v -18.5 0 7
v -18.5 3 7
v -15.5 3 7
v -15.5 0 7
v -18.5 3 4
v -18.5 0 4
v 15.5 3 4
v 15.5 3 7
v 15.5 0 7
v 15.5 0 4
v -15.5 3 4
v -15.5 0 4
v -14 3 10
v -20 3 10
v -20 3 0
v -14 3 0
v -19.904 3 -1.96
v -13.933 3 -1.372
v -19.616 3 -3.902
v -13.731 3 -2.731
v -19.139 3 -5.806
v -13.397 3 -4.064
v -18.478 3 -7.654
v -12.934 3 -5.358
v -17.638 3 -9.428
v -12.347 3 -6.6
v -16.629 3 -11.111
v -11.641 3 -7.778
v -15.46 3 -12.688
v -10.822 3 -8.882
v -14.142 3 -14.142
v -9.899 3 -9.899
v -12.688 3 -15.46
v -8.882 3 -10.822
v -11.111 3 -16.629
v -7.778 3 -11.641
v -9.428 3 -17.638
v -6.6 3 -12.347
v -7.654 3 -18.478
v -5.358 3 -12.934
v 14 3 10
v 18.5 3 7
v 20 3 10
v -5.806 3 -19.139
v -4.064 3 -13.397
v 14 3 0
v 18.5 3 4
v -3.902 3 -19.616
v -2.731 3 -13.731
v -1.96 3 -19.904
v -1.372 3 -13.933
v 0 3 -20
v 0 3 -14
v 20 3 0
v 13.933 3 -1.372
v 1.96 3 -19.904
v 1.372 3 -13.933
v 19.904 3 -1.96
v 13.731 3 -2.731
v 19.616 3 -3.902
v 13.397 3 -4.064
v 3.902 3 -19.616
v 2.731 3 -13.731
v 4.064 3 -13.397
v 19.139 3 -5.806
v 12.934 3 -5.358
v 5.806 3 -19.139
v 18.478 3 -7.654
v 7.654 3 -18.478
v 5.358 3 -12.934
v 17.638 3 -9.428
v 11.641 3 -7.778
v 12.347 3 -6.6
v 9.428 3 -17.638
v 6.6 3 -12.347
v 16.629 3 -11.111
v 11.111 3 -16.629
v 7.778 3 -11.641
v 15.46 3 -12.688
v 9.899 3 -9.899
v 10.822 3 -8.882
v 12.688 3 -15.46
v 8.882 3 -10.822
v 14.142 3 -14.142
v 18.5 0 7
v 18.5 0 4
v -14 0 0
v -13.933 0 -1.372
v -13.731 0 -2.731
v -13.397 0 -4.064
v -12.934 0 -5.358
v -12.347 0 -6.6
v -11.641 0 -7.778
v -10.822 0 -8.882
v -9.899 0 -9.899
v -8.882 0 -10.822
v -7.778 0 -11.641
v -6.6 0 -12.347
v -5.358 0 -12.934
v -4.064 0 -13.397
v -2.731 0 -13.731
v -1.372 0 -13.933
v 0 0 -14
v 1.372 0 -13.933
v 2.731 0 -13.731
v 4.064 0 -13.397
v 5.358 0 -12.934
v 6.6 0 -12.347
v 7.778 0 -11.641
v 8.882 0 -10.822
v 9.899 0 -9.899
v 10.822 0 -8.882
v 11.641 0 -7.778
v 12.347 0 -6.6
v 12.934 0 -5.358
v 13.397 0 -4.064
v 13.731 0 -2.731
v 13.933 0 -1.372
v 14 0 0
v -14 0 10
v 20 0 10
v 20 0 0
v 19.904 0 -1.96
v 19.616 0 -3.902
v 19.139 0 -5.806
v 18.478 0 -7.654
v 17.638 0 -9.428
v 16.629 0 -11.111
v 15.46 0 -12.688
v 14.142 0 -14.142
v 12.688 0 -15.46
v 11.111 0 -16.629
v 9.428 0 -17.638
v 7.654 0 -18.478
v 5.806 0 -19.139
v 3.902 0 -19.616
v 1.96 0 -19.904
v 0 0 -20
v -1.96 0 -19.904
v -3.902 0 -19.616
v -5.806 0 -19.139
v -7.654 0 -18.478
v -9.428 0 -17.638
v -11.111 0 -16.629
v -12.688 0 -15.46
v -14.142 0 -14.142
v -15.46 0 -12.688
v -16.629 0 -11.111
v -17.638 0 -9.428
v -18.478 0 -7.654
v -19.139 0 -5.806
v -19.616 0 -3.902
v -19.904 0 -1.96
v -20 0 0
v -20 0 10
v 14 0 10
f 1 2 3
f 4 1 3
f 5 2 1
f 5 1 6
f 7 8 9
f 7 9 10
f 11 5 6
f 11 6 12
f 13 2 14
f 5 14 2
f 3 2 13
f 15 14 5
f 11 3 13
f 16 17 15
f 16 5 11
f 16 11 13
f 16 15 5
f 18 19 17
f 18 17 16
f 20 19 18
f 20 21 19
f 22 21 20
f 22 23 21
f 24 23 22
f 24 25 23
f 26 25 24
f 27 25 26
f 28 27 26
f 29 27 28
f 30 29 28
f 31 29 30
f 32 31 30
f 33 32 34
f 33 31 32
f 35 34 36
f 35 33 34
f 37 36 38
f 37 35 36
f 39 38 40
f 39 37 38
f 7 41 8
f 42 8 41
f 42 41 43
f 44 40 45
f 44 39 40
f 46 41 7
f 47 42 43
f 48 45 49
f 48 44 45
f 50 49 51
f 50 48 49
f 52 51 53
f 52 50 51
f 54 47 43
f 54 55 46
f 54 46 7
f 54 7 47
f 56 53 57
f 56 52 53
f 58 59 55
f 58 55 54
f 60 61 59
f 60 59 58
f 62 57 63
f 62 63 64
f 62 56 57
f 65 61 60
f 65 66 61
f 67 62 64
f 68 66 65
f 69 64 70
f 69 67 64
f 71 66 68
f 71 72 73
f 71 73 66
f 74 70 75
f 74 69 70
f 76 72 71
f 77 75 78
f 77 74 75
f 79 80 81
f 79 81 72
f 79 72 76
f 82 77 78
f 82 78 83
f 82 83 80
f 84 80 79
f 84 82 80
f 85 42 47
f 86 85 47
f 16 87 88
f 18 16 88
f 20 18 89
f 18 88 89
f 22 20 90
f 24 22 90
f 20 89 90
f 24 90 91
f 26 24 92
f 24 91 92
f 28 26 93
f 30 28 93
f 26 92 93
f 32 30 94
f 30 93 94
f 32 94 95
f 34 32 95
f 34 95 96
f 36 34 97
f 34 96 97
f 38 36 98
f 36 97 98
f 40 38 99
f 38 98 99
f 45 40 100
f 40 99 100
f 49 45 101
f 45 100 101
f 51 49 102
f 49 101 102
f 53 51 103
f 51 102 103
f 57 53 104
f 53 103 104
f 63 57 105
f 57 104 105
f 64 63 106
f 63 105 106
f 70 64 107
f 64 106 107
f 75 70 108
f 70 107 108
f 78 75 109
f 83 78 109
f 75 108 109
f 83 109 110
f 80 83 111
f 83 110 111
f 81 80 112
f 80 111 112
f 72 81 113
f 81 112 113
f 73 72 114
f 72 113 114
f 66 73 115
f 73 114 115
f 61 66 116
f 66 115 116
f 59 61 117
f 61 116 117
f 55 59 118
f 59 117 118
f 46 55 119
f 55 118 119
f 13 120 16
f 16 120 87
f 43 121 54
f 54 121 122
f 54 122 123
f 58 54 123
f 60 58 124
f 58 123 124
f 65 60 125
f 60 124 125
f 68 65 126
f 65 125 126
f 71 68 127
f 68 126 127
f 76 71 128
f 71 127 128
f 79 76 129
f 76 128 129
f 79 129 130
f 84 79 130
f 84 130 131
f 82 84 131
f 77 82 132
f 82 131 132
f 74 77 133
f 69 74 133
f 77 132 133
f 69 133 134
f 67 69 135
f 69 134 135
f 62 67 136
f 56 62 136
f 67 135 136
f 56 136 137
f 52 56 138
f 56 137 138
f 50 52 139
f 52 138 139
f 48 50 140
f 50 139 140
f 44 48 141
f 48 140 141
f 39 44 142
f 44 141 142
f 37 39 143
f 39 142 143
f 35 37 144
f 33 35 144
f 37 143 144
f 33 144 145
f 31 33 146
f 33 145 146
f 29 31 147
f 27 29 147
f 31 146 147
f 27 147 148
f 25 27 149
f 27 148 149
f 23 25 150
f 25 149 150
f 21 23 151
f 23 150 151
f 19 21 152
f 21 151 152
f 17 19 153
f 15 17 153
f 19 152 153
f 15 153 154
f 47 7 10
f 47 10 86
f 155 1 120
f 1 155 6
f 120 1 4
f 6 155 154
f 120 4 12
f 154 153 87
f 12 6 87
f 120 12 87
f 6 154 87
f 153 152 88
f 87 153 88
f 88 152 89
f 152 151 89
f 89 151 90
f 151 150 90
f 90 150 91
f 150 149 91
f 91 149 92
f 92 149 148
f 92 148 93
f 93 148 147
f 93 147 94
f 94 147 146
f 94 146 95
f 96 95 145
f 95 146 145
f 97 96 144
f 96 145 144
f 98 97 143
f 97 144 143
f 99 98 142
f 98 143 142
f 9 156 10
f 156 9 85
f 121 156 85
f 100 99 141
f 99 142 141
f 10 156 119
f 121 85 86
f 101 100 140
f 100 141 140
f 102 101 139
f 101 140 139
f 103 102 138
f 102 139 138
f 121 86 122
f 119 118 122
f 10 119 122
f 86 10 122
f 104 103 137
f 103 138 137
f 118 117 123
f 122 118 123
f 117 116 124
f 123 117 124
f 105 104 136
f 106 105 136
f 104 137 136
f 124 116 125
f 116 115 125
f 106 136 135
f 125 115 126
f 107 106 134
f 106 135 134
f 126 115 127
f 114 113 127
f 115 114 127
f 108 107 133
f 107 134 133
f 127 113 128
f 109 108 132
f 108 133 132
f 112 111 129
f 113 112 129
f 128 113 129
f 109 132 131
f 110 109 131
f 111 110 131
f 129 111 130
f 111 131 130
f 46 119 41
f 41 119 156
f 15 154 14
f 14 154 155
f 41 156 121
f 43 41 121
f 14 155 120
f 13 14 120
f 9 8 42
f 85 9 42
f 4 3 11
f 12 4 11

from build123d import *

# Parameters (mm, degrees)
BOSS_EXTRUDE1_DEPTH = 3
SKETCH2_W           = 3
SKETCH2_H           = 3
CUT_EXTRUDE1_DEPTH  = 70.726054689


with BuildPart() as part:
    # Sketch1 → Boss-Extrude1 (new body)
    with BuildSketch(Plane(origin=(0, 0, 0), x_dir=(1, 0, 0), z_dir=(0, 1, 0))):
        with BuildLine():
            Line((-20, 0), (-20, -10))
            Line((-20, -10), (-14, -10))
            Line((-14, -10), (-14, 0))
            ThreePointArc((-14, 0), (0, 14), (14, 0))
            Line((14, 0), (14, -10))
            Line((14, -10), (20, -10))
            Line((20, -10), (20, 0))
            ThreePointArc((20, 0), (0, 20), (-20, 0))
        make_face()
    extrude(amount=BOSS_EXTRUDE1_DEPTH)

    # Sketch2 → Cut-Extrude1 (cut, through all)
    with BuildSketch(Plane(origin=(-39.0910666, 6, -26.523534202), x_dir=(1, 0, 0), z_dir=(0, 1, 0))):
        with Locations((22.0910666, -32.023534202)):
            Rectangle(SKETCH2_W, SKETCH2_H)
        with Locations((56.0910666, -32.023534202)):
            Rectangle(SKETCH2_W, SKETCH2_H)
    extrude(amount=-CUT_EXTRUDE1_DEPTH, mode=Mode.SUBTRACT)


solid = part.part
